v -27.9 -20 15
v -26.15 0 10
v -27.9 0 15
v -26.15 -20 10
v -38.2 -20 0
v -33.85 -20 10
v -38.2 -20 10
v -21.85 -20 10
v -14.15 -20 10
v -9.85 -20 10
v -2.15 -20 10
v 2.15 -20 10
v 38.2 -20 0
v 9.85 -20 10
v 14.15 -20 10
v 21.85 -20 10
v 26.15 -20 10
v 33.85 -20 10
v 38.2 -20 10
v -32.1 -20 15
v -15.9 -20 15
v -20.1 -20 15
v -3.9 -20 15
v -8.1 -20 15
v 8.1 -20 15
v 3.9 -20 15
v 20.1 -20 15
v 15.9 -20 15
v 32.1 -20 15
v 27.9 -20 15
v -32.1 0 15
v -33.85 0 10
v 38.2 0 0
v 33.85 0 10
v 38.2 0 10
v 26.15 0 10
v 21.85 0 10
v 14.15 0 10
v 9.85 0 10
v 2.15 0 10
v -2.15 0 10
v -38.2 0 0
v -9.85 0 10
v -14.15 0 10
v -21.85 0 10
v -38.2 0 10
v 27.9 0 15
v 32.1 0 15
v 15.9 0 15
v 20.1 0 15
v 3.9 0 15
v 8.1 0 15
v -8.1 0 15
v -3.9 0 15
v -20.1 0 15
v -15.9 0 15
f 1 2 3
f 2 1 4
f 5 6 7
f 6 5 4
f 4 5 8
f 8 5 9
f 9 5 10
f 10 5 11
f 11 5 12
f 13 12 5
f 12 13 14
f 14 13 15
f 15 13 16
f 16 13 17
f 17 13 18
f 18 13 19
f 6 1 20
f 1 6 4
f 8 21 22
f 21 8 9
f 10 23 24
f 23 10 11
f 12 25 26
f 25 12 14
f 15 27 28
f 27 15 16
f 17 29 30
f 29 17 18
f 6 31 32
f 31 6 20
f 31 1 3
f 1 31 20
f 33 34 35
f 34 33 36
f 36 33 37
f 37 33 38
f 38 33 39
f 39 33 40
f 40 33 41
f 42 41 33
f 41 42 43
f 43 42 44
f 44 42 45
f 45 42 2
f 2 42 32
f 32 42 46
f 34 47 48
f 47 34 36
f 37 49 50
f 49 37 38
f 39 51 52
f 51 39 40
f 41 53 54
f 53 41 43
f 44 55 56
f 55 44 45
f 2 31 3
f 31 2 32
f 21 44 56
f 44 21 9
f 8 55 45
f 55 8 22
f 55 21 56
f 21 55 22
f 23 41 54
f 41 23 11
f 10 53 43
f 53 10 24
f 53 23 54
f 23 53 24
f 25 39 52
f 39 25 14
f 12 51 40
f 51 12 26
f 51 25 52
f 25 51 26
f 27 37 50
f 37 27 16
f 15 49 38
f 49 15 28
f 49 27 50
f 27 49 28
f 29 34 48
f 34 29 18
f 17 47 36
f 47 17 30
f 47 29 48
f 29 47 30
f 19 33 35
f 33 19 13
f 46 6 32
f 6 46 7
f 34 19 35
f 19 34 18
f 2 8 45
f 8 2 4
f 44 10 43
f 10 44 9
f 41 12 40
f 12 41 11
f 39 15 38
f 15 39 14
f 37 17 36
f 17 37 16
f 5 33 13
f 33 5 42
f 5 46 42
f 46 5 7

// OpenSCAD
$fn = 32;

// ----------------------------------------------------------------------
// Toothed rack, 6 teeth
// 12 mm pitch, 5 mm teeth
// ----------------------------------------------------------------------

// --- parameters (mm) ---
bar_w = 20;     // bar width (Y)
bar_h = 10;     // bar height (Z)
teeth = 6;      // number of teeth
pitch = 12;     // tooth pitch
tooth_h = 5;    // tooth height above the bar
root_w = 8.4;   // tooth width at the root
crest_w = 4.2;  // tooth width at the crest

// --- derived feature positions (mm) ---
span = (teeth - 1) * pitch;  // = 60   distance between the outer teeth
bar_l = span + root_w + 8;   // = 76.4   bar length: teeth plus 4 mm at each end
tooth_x = -span / 2;         // = -30   X of the first tooth
height = bar_h + tooth_h;    // = 15   overall height
feature_centers = [
  [tooth_x + 0 * pitch, -bar_w / 2],
  [tooth_x + 1 * pitch, -bar_w / 2],
  [tooth_x + 2 * pitch, -bar_w / 2],
  [tooth_x + 3 * pitch, -bar_w / 2],
  [tooth_x + 4 * pitch, -bar_w / 2],
  [tooth_x + 5 * pitch, -bar_w / 2]
];   // tooth centre line, drives the tooth loop

// bar with a rack of teeth, one extruded trapezoium per centre
module rack_tooth() {
  linear_extrude(height = bar_w)
    polygon(points = [
      [0, 0],
      [root_w, 0],
      [root_w / 2 + crest_w / 2, tooth_h + 1],
      [root_w / 2 - crest_w / 2, tooth_h + 1]
    ]);
}

union() {
  translate([-bar_l / 2, -bar_w, 0]) cube([bar_l, bar_w, bar_h]);
  for (centre = feature_centers)
    translate([centre[0] - root_w / 2, 0, bar_h - 1]) rotate([90, 0, 0]) rack_tooth();
}
